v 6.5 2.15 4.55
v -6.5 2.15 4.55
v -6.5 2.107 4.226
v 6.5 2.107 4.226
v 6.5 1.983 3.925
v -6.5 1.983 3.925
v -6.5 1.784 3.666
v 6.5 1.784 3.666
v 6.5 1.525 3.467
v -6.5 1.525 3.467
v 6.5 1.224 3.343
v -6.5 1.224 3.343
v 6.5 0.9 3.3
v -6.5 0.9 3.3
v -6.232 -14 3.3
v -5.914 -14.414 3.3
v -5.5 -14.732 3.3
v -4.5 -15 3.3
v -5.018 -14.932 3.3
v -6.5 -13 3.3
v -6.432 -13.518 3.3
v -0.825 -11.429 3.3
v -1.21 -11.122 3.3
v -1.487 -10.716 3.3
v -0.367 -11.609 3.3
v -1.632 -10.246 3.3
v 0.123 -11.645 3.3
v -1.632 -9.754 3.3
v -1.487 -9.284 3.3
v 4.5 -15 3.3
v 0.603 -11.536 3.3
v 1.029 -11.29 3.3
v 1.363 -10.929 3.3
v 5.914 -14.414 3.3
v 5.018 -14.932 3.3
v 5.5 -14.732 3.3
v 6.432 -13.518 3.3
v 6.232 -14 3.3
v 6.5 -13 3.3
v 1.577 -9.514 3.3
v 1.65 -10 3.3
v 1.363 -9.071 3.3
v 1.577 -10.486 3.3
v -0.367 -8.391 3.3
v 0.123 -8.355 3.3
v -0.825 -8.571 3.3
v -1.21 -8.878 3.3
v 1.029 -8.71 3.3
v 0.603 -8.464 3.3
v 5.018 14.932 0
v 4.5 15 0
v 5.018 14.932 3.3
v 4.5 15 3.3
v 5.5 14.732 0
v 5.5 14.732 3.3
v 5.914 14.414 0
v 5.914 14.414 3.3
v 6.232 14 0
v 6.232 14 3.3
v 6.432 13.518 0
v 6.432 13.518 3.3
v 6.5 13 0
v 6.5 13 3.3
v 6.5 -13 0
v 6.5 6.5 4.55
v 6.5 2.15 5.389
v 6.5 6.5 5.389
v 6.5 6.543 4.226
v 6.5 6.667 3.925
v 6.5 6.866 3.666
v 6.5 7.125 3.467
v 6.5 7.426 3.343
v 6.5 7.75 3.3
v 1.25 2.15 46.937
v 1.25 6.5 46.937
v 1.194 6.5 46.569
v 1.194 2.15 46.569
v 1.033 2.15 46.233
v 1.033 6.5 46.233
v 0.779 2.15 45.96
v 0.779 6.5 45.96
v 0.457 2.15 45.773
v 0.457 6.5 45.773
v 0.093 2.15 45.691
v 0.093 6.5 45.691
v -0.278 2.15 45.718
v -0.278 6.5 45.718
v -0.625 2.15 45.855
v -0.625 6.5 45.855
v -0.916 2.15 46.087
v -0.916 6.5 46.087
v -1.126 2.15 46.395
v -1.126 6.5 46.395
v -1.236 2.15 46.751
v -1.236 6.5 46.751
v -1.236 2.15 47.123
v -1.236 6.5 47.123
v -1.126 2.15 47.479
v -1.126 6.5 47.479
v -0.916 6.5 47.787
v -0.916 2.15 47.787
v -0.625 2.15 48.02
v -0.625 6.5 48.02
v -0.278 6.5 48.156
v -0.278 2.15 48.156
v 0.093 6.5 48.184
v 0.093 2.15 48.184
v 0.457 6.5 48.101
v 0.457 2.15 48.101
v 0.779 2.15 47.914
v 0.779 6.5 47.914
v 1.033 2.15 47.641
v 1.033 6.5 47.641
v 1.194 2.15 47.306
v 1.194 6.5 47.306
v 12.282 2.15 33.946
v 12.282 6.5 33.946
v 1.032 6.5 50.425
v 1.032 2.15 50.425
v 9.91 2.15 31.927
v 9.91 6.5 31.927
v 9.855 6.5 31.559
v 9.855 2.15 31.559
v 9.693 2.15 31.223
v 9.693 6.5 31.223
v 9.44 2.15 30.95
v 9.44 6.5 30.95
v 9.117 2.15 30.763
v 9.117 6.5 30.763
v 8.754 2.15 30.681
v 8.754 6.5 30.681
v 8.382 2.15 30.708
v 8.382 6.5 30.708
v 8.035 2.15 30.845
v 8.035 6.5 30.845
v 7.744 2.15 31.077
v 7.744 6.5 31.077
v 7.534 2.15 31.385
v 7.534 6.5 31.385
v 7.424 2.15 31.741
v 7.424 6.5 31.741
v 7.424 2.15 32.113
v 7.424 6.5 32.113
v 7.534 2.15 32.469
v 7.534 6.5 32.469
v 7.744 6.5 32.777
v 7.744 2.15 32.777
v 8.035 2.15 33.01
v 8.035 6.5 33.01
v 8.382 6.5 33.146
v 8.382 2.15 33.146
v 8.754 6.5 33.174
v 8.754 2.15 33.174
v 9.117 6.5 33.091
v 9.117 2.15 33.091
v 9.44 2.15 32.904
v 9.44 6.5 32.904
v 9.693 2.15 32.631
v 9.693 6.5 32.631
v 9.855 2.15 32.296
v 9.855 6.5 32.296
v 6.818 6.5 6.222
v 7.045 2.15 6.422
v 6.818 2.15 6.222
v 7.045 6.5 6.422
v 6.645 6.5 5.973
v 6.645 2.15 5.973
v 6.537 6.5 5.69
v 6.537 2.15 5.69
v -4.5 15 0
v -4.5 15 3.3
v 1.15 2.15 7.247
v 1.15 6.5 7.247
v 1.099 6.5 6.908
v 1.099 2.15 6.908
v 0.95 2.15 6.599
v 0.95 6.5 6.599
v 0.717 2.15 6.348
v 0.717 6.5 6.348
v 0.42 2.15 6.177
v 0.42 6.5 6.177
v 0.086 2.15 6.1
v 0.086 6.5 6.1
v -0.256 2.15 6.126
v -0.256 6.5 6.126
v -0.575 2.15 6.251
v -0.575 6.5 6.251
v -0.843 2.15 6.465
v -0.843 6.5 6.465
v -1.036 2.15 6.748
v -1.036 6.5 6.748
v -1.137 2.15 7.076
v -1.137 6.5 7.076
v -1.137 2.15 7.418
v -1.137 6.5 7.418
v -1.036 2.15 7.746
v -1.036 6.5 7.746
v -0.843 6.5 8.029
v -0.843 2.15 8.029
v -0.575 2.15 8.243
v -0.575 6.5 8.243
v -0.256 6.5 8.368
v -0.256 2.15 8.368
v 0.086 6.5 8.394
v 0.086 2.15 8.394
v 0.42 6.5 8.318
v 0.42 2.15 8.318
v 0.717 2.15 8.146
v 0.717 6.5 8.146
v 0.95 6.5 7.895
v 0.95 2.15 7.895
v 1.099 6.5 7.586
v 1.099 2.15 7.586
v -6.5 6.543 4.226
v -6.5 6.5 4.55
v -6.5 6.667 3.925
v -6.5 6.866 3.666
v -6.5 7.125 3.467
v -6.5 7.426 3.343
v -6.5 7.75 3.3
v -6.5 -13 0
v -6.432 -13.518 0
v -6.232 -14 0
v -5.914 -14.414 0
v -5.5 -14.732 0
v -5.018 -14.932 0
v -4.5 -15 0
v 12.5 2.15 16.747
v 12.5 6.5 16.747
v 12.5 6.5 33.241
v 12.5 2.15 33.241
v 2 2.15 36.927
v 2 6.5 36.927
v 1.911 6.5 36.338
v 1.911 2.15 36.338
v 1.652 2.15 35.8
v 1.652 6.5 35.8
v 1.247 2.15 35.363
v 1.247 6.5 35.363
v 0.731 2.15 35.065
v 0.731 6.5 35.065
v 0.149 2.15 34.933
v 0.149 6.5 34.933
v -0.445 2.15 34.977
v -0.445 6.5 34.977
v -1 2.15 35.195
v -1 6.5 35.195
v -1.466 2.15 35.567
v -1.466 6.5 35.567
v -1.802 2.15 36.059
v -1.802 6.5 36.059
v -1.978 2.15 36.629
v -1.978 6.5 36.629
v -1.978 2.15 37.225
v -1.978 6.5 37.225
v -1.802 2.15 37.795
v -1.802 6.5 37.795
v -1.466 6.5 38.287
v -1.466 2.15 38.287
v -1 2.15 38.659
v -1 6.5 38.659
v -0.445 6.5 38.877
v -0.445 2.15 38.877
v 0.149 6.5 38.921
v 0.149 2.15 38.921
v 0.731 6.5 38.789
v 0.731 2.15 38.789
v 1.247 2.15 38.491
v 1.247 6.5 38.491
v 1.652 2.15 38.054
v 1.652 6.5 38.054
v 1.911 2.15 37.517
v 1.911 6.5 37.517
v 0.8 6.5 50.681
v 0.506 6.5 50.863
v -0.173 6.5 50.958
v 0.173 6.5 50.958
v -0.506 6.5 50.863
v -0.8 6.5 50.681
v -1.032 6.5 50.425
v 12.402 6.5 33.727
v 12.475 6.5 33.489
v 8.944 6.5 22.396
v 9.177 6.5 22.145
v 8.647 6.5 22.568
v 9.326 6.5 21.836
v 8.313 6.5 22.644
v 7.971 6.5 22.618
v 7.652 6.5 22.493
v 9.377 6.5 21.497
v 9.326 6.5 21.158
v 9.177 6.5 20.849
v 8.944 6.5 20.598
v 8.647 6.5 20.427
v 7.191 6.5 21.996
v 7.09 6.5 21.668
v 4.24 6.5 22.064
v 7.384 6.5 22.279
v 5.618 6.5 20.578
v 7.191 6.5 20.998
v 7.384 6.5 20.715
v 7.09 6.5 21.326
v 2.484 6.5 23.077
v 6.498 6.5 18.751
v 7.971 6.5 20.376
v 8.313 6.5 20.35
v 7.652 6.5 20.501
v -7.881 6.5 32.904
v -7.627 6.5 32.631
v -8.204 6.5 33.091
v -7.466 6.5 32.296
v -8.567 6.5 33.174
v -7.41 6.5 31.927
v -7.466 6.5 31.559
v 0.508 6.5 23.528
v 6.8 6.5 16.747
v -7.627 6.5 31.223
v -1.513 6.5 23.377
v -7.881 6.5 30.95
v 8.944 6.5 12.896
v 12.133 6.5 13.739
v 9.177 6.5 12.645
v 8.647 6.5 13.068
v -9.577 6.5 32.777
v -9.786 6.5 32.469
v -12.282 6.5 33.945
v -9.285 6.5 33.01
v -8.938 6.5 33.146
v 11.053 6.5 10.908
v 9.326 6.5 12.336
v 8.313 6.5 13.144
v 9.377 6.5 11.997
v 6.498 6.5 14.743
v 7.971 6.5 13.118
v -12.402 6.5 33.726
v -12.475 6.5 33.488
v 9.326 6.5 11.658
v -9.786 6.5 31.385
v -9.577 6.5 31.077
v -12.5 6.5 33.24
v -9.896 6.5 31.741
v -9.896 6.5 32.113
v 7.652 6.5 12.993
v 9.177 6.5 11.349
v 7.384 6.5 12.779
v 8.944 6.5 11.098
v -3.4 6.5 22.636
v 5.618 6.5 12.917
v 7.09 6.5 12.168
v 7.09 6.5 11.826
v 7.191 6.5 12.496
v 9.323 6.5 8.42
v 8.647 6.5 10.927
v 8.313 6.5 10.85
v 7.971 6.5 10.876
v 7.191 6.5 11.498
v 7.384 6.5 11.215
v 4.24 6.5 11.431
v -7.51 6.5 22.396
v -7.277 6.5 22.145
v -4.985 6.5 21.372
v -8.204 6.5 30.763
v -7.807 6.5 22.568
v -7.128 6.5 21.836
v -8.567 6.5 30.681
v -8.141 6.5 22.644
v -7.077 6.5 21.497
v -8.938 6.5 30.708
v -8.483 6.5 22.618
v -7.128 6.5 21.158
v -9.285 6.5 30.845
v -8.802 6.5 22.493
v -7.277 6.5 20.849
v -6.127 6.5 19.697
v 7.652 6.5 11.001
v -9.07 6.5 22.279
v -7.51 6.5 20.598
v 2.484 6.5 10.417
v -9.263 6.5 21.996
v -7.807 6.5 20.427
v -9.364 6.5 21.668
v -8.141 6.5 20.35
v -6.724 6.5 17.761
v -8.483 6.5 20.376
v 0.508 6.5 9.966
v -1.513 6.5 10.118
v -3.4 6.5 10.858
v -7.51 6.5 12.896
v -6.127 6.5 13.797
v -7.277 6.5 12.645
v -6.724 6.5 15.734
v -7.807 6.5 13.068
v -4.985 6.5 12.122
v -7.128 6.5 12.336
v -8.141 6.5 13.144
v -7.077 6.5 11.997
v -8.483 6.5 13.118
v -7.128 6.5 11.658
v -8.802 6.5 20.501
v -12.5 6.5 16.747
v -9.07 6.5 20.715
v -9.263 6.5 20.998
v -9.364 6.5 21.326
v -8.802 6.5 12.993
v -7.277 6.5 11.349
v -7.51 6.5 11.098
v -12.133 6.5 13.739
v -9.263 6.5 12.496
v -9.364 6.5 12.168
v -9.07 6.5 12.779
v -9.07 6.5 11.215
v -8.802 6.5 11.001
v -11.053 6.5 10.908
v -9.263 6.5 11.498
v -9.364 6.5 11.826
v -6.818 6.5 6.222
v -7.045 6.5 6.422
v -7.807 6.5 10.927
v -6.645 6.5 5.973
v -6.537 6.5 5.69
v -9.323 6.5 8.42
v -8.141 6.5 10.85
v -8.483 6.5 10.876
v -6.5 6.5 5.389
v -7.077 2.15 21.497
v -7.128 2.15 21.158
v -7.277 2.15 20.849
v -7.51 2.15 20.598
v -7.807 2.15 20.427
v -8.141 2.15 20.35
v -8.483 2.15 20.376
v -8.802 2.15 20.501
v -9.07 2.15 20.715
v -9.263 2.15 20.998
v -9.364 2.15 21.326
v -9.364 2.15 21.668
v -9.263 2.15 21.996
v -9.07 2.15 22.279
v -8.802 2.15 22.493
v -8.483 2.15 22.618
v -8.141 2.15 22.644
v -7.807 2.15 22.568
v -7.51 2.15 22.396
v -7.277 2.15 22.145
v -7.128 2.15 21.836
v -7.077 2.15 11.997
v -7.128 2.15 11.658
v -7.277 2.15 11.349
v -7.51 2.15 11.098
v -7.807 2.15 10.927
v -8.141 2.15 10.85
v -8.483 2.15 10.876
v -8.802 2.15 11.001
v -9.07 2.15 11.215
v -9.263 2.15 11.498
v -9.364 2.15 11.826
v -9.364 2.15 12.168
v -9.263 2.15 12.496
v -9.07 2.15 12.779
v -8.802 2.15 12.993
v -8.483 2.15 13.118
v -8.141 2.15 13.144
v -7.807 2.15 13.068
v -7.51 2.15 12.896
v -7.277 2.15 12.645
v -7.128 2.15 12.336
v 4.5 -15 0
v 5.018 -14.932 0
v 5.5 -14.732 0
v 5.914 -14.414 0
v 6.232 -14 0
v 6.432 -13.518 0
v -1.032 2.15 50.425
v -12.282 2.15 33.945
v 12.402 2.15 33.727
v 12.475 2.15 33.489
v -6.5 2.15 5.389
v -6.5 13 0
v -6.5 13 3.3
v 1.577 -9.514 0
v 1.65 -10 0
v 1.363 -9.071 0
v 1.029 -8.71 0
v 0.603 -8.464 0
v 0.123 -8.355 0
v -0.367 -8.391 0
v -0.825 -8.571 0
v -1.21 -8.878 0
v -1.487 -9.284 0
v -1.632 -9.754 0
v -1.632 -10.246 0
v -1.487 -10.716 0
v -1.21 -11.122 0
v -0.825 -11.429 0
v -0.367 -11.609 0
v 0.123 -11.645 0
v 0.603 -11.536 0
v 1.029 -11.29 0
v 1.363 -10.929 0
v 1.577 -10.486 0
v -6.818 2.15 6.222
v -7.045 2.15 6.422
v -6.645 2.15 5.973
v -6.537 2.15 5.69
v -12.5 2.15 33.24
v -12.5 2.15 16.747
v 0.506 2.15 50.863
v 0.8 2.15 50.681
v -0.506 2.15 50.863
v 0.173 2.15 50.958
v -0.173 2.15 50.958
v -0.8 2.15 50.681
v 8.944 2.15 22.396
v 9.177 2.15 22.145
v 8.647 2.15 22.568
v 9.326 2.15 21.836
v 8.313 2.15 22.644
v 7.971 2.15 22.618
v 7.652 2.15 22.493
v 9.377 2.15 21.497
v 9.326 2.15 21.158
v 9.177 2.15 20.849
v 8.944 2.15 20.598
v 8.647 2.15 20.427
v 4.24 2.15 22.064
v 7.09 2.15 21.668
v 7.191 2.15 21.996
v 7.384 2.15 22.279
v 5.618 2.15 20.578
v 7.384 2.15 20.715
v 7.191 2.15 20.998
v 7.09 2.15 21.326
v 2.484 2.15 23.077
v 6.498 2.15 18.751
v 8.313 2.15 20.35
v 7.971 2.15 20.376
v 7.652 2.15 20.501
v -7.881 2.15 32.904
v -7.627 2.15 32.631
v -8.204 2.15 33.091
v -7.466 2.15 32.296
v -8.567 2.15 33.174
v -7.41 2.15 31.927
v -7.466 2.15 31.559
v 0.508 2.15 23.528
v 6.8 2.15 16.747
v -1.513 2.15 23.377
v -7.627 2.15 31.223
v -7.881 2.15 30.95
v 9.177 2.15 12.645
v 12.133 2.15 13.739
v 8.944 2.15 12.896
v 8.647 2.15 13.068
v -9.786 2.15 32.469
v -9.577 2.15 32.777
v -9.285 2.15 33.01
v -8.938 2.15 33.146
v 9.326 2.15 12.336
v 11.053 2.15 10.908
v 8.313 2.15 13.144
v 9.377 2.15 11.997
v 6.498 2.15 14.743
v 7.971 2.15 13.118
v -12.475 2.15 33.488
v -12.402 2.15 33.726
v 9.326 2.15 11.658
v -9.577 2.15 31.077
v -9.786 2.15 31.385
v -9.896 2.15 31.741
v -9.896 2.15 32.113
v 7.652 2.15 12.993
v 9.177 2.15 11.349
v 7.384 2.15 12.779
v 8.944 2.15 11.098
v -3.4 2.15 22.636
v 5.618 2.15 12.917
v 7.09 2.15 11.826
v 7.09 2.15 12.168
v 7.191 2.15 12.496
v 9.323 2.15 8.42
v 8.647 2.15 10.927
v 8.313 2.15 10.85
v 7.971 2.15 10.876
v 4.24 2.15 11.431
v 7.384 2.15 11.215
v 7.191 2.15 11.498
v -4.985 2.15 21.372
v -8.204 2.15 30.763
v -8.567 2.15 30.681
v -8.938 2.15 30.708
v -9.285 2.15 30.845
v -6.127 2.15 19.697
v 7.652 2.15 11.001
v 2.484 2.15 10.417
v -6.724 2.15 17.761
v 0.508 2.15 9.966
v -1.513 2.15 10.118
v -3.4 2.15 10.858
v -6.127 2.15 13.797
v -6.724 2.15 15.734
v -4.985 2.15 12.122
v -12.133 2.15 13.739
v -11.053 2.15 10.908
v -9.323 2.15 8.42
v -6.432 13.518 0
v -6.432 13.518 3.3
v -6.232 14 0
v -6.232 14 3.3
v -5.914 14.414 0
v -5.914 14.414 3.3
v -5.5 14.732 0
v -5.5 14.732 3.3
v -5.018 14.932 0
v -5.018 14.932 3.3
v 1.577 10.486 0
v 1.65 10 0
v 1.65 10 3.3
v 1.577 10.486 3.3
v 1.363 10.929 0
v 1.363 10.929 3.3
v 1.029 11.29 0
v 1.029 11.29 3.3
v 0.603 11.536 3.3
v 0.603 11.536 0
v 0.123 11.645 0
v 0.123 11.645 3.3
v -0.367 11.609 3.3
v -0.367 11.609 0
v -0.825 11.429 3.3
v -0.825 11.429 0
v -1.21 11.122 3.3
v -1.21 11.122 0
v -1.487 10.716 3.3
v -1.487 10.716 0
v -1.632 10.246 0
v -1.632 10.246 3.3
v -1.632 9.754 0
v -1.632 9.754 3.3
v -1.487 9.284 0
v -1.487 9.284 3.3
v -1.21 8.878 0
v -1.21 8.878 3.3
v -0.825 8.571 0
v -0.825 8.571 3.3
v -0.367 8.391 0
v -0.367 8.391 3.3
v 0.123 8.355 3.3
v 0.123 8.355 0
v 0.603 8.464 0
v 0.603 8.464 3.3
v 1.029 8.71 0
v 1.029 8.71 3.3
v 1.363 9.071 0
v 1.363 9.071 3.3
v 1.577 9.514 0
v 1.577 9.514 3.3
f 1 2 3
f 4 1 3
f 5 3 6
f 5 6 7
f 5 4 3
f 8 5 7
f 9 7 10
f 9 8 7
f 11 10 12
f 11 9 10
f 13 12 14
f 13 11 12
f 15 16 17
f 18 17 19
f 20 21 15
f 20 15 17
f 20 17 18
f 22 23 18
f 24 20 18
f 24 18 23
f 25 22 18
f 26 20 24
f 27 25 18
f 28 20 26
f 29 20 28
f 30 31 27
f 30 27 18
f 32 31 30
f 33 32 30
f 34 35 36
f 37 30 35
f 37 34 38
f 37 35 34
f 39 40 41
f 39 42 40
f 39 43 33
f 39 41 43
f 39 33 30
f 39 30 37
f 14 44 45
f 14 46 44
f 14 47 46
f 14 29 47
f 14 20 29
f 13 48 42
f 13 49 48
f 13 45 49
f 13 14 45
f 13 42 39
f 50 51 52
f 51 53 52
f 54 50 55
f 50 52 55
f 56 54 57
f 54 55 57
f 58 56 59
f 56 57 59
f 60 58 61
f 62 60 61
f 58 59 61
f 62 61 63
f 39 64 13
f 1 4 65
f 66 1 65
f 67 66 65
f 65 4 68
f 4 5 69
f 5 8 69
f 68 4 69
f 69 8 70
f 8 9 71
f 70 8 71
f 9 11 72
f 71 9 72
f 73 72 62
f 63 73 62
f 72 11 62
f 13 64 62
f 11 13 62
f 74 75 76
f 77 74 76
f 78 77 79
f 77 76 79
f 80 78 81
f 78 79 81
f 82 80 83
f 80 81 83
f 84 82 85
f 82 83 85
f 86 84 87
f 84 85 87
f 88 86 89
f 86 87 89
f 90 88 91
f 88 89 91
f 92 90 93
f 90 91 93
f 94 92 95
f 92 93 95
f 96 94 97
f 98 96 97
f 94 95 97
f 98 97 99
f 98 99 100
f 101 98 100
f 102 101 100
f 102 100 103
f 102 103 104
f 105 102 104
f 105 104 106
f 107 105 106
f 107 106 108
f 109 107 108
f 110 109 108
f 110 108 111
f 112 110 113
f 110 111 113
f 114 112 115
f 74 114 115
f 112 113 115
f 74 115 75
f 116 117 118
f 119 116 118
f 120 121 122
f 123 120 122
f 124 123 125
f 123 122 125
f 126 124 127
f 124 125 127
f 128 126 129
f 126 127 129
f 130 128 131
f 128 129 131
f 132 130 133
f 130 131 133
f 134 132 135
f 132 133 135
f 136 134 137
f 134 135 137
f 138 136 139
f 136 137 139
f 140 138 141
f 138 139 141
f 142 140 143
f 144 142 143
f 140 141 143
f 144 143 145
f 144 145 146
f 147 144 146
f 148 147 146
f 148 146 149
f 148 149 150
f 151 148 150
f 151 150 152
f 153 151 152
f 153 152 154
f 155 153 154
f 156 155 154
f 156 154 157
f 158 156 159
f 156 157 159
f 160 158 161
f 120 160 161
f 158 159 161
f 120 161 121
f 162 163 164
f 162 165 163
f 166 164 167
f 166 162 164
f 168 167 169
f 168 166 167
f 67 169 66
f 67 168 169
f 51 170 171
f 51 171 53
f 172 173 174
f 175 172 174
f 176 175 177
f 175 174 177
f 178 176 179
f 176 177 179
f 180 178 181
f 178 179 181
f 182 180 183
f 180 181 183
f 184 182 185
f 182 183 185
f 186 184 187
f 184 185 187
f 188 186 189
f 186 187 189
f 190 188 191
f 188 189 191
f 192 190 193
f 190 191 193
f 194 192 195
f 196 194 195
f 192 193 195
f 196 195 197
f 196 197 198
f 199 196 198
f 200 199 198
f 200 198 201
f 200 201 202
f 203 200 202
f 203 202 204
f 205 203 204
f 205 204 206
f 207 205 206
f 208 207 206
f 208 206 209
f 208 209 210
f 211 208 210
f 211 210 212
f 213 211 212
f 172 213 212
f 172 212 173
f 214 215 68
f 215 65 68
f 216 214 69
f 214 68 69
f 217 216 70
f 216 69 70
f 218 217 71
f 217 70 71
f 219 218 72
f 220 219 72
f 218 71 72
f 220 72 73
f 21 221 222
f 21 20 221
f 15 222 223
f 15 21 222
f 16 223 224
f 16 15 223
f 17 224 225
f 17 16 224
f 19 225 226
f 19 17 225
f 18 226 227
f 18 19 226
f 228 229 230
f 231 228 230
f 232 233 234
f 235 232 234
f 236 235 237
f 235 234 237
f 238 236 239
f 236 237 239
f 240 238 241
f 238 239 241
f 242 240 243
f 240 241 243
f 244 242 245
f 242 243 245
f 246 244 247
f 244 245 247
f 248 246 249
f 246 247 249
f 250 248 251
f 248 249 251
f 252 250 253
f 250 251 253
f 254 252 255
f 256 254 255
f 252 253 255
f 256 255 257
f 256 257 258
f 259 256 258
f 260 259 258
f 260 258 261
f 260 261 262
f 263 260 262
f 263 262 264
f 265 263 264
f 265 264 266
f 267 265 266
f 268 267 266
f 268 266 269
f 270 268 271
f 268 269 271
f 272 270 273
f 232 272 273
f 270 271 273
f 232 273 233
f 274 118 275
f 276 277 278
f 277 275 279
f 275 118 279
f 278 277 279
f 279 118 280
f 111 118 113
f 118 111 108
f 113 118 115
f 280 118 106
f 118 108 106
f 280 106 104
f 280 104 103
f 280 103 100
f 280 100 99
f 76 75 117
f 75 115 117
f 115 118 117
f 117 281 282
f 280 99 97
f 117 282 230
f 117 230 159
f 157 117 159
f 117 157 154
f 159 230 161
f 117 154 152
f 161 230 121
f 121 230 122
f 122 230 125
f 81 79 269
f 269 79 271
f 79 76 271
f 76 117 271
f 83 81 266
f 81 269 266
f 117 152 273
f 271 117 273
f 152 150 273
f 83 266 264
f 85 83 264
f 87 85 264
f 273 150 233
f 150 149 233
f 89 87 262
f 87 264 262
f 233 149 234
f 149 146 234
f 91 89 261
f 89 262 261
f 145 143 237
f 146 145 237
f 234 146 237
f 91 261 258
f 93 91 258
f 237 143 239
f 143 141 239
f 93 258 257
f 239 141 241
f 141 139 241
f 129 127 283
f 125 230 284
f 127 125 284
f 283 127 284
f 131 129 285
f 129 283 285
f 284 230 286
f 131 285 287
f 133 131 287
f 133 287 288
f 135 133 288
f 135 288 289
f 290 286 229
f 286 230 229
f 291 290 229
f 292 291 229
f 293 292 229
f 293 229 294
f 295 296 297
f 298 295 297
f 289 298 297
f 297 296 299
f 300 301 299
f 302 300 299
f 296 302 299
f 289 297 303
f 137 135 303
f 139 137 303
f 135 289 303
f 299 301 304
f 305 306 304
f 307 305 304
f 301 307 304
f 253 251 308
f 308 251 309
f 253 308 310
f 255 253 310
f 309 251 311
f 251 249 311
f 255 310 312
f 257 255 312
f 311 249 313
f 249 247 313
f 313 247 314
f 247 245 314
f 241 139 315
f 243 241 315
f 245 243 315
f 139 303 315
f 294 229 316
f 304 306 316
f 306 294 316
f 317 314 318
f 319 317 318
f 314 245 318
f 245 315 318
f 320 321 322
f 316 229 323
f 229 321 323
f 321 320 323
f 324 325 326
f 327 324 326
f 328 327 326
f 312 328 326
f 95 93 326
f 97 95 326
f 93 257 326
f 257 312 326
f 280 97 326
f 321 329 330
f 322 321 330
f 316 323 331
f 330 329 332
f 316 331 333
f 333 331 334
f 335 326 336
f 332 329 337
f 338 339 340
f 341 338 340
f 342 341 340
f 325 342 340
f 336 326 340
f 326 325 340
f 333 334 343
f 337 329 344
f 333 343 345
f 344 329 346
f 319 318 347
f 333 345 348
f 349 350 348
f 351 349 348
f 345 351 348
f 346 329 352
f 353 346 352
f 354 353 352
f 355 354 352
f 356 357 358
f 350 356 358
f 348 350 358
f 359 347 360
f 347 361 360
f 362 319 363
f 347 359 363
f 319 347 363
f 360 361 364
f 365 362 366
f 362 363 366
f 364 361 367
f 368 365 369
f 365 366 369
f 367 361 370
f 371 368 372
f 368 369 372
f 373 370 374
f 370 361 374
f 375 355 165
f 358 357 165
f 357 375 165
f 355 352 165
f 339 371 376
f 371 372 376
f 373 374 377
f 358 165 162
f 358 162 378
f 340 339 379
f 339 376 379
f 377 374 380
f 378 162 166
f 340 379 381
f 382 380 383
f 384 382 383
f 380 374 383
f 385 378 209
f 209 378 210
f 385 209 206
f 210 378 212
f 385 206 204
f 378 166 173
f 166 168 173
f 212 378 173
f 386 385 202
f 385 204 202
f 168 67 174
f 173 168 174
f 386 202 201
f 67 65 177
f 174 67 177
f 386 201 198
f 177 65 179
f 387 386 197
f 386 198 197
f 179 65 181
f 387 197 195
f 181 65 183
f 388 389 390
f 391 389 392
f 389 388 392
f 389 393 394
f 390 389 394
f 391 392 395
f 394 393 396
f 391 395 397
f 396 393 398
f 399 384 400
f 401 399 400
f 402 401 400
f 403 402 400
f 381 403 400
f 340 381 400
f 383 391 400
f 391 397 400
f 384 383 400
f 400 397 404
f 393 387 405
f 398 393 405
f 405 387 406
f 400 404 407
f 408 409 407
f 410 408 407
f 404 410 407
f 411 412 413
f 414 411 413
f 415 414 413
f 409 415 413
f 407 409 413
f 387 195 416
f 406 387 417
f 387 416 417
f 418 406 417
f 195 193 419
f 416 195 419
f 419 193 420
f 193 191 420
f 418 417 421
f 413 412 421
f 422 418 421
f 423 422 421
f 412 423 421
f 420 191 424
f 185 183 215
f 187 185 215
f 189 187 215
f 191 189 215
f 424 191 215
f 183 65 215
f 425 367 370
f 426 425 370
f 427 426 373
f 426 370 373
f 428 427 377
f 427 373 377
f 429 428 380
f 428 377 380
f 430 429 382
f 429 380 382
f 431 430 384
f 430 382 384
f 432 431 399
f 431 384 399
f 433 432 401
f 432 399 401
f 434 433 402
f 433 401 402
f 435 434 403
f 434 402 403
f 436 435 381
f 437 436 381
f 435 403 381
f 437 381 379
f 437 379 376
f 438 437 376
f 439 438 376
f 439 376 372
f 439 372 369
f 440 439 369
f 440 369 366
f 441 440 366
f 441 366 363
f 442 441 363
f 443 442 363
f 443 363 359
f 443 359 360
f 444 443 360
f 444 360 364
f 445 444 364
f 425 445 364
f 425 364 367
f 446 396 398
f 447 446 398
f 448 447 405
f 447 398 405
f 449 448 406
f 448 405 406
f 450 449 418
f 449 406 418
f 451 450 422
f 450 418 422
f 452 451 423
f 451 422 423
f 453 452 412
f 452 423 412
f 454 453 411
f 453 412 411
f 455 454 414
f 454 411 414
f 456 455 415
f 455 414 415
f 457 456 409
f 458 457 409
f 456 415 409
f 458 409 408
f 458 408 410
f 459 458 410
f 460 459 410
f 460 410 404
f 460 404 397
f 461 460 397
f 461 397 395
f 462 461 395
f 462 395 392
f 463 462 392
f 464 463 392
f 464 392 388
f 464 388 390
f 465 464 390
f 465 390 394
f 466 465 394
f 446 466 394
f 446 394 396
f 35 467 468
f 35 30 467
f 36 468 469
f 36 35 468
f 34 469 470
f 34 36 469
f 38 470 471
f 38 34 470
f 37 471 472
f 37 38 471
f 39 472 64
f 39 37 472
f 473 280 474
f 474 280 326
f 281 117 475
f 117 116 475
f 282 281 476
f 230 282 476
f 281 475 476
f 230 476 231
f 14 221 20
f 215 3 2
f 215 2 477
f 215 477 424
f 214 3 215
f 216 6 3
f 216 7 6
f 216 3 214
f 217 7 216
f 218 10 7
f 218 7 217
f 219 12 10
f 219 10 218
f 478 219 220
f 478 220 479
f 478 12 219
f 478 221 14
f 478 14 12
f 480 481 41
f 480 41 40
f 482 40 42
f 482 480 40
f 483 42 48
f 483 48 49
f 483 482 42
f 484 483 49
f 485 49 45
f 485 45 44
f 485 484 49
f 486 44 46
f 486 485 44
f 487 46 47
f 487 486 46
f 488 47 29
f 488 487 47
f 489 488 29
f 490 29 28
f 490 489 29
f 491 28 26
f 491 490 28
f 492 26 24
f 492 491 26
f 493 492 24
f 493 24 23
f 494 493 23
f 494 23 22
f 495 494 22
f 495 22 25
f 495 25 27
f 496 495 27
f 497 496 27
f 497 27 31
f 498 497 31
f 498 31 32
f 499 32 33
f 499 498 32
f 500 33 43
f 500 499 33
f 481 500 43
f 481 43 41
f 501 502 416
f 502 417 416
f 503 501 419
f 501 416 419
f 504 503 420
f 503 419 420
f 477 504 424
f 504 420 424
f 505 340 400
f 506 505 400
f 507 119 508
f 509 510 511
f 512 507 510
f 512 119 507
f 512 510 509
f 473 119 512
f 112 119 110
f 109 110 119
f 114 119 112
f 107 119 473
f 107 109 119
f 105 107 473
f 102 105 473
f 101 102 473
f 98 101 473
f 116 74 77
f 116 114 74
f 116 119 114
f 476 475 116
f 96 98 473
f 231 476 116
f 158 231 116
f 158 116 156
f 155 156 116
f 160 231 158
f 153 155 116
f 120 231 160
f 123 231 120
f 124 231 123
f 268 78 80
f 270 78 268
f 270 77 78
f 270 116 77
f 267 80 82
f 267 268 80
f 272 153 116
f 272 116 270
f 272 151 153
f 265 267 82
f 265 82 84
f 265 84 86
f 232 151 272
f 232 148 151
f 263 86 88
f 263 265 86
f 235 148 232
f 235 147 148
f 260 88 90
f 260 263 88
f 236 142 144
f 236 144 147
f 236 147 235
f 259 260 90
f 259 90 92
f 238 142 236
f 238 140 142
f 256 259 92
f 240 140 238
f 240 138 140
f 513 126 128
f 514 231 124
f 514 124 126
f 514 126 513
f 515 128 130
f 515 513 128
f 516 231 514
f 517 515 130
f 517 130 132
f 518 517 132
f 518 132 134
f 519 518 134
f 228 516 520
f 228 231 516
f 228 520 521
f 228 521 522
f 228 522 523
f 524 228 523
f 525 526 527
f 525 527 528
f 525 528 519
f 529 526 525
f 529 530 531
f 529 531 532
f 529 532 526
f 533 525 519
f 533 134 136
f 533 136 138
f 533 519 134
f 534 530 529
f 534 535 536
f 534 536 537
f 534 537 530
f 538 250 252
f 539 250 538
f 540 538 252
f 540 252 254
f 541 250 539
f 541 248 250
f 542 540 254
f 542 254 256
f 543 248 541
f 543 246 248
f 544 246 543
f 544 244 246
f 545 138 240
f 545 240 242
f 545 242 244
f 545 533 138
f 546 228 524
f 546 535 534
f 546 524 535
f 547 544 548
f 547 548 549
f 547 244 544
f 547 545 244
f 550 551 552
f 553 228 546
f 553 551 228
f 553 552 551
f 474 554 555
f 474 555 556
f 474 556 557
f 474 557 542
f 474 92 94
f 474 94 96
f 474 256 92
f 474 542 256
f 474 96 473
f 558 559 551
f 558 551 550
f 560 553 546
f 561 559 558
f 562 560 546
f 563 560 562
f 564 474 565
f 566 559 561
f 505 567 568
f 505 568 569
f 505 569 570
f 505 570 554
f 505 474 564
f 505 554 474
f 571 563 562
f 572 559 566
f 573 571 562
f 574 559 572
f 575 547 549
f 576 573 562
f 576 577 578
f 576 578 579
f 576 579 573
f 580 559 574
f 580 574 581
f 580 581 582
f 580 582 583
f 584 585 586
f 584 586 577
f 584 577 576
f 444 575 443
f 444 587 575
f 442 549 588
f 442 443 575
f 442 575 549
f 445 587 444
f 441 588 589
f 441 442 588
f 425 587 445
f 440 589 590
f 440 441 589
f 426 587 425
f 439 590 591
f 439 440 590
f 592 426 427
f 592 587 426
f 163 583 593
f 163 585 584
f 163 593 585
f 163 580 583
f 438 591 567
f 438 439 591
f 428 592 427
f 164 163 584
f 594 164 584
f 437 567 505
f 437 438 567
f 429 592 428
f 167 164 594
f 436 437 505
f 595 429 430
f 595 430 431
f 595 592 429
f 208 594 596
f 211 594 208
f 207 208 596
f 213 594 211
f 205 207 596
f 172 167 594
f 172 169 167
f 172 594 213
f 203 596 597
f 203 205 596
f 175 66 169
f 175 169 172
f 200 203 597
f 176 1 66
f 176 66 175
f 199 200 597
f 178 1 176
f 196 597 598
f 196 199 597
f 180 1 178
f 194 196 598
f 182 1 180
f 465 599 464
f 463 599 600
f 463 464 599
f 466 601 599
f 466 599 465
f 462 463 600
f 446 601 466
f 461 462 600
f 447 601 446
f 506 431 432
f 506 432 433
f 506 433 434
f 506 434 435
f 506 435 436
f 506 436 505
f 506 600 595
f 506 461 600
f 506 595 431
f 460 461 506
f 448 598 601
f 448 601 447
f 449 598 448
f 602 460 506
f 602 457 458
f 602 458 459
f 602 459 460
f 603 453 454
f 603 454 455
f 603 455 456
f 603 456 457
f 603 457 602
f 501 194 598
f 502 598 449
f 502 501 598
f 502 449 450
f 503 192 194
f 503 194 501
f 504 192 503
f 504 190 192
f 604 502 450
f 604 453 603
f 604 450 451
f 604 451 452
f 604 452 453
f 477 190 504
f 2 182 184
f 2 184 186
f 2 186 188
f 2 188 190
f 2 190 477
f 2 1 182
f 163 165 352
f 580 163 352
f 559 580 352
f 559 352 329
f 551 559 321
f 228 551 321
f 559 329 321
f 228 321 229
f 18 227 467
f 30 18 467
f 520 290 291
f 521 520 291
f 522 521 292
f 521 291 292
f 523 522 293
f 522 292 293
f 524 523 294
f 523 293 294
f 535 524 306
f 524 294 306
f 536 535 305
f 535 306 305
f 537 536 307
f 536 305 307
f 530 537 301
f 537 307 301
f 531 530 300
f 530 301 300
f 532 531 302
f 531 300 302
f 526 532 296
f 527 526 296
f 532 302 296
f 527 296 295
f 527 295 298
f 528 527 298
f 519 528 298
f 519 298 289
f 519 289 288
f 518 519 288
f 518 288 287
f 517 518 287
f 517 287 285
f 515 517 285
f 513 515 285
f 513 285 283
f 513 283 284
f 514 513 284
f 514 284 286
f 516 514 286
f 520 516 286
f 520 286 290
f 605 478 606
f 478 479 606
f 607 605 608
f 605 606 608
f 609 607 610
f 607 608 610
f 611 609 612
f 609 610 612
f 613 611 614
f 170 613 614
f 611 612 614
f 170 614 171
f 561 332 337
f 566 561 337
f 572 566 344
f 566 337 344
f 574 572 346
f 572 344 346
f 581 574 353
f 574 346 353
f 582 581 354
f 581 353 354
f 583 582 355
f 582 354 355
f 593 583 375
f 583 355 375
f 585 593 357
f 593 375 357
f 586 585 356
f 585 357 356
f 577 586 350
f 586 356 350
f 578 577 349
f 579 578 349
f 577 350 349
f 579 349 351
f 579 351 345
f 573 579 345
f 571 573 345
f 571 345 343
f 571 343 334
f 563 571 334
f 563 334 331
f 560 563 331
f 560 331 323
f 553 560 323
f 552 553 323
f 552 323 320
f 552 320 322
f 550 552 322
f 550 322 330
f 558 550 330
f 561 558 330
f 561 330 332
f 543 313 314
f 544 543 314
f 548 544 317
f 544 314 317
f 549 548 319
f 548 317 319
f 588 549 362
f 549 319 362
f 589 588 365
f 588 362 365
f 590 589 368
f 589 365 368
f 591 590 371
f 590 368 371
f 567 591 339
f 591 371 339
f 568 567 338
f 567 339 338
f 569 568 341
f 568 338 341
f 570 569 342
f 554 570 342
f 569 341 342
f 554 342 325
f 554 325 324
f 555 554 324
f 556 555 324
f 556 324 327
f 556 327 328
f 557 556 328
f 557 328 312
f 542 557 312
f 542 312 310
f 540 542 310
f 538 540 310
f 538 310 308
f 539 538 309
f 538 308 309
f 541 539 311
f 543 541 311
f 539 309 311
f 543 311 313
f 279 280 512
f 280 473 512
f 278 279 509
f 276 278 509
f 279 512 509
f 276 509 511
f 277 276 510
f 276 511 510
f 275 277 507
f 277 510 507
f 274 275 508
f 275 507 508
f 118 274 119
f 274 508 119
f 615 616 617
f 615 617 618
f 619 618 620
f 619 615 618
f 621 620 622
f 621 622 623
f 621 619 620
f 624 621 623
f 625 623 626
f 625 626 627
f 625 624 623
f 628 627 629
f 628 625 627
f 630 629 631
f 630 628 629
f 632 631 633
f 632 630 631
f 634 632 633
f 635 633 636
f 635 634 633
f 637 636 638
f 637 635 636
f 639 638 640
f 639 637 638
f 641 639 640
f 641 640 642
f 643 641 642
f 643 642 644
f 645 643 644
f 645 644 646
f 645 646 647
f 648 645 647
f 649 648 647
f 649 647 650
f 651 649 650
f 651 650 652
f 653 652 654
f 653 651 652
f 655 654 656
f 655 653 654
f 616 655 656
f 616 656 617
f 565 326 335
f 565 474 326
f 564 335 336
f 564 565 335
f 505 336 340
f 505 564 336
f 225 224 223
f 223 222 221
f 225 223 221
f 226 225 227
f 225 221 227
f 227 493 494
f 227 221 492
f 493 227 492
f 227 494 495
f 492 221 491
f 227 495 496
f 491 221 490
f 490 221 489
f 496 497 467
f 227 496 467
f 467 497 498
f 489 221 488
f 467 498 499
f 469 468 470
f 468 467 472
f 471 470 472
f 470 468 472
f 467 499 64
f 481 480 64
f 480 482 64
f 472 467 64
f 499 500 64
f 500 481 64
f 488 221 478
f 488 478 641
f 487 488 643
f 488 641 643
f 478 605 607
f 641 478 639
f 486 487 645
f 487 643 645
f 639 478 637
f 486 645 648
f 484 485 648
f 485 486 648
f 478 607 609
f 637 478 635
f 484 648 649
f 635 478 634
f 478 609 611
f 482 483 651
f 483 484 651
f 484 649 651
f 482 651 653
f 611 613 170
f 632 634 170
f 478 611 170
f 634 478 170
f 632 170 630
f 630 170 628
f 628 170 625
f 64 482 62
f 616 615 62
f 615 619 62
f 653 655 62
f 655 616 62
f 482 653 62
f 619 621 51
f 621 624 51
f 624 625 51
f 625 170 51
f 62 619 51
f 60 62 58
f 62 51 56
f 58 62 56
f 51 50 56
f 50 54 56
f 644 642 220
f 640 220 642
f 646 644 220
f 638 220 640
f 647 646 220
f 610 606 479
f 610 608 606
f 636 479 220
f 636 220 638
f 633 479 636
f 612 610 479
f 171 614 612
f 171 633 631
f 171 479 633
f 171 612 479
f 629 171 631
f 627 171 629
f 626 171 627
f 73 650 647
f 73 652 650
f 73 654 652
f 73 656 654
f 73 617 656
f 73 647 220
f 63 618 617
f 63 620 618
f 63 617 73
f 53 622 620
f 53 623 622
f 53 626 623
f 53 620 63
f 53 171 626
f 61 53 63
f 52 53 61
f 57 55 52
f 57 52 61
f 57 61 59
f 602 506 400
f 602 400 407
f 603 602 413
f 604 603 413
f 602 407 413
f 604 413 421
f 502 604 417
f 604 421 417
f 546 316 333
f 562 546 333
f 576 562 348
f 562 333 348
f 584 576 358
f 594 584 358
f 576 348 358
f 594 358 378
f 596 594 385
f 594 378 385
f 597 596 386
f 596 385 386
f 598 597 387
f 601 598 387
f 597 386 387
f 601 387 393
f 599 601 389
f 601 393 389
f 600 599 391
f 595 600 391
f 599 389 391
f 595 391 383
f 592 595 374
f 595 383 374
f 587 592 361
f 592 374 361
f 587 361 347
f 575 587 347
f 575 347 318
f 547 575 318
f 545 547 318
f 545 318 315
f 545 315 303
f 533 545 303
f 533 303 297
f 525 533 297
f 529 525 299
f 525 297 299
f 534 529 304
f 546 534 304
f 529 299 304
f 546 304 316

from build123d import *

# Parameters (mm, degrees)
ESQUISSE1_W             = 13
ESQUISSE1_H             = 30
ESQUISSE1_R             = 1.65
BOSS_EXTRU_1_DEPTH      = 3.3
CONG_1_R                = 2
ESQUISSE2_W             = 13
ESQUISSE2_H             = 4.34999702
BOSS_EXTRU_2_DEPTH      = 2.77
ESQUISSE4_R             = 6.8
BOSS_EXTRU_4_DEPTH      = 4.349997
ESQUISSE6_R             = 1.15
ENL_V_MAT_EXTRU_2_DEPTH = 22.49999702
ESQUISSE8_R             = 2
ESQUISSE8_R_2           = 1.25
BOSS_EXTRU_5_DEPTH      = 4.349997
CONG_2_R                = 1.25


with BuildPart() as part:
    # Esquisse1 → Boss.-Extru.1 (new body)
    with BuildSketch(Plane.XY):
        Rectangle(ESQUISSE1_W, ESQUISSE1_H)
        with Locations((0, 10)):
            Circle(ESQUISSE1_R, mode=Mode.SUBTRACT)
        with Locations((0, -10)):
            Circle(ESQUISSE1_R, mode=Mode.SUBTRACT)
    extrude(amount=BOSS_EXTRU_1_DEPTH)

    # Congé1
    cong_1_edges = [part.edges().sort_by_distance(p)[0] for p in [
        (6.5, -15, 1.65),
        (-6.5, -15, 1.65),
        (-6.5, 15, 1.65),
        (6.5, 15, 1.65),
    ]]
    fillet(cong_1_edges, radius=CONG_1_R)

    # Esquisse2 → Boss.-Extru.2 (add)
    with BuildSketch(Plane.XY.offset(3.3)):
        with Locations((0, 4.32499851)):
            Rectangle(ESQUISSE2_W, ESQUISSE2_H)
    extrude(amount=BOSS_EXTRU_2_DEPTH)

    # Esquisse4 → Boss.-Extru.4 (add)
    with BuildSketch(Plane(origin=(0, 6.49999702, 0), x_dir=(1, 0, 0), z_dir=(0, 1, 0))):
        with BuildLine():
            Line((-6.5, -6.07), (6.5, -6.07))
            ThreePointArc((6.5, -6.07), (12.5, -16.747078252), (6.5, -27.424156504))
            Line((6.5, -27.424156504), (-6.5, -27.424156504))
            ThreePointArc((-6.5, -27.424156504), (-12.5, -16.747078252), (-6.5, -6.07))
        make_face()
        with Locations((0, -16.747078252)):
            Circle(ESQUISSE4_R, mode=Mode.SUBTRACT)
    extrude(amount=-BOSS_EXTRU_4_DEPTH)

    # Esquisse6 → Enlèv. mat.-Extru.2 (cut, through all)
    with BuildSketch(Plane(origin=(0, 6.49999702, 0), x_dir=(1, 0, 0), z_dir=(0, 1, 0))):
        with Locations((0, -7.247078252)):
            Circle(ESQUISSE6_R)
        with Locations((-8.227241336, -11.997078252)):
            Circle(ESQUISSE6_R)
        with Locations((8.227241336, -11.997078252)):
            Circle(ESQUISSE6_R)
        with Locations((-8.227241336, -21.497078252)):
            Circle(ESQUISSE6_R)
        with Locations((8.227241336, -21.497078252)):
            Circle(ESQUISSE6_R)
    extrude(amount=-ENL_V_MAT_EXTRU_2_DEPTH, mode=Mode.SUBTRACT)

    # Esquisse8 → Boss.-Extru.5 (add)
    with BuildSketch(Plane(origin=(0, 6.49999702, 0), x_dir=(1, 0, 0), z_dir=(0, 1, 0))):
        with BuildLine():
            Line((0, -51.937078252), (-12.5, -33.625808063))
            Line((-12.5, -33.625808063), (-12.5, -16.747078252))
            ThreePointArc((-12.5, -16.747078252), (-10.897247359, -22.870802609), (-6.5, -27.424156504))
            Line((-6.5, -27.424156504), (6.5, -27.424156504))
            ThreePointArc((6.5, -27.424156504), (10.897247359, -22.870802609), (12.5, -16.747078252))
            Line((12.5, -16.747078252), (12.5, -33.627078252))
            Line((12.5, -33.627078252), (0, -51.937078252))
        make_face()
        with Locations((0, -36.927078252)):
            Circle(ESQUISSE8_R, mode=Mode.SUBTRACT)
        with Locations((8.660254038, -31.927078252)):
            Circle(ESQUISSE8_R_2, mode=Mode.SUBTRACT)
        with Locations((-8.660254038, -31.927078252)):
            Circle(ESQUISSE8_R_2, mode=Mode.SUBTRACT)
        with Locations((0, -46.937078252)):
            Circle(ESQUISSE8_R_2, mode=Mode.SUBTRACT)
    extrude(amount=-BOSS_EXTRU_5_DEPTH)

    # Congé2
    cong_2_edges = [part.edges().sort_by_distance(p)[0] for p in [
        (-12.5, 4.32499852, 33.625808063),
        (0, 4.32499852, 51.937078252),
        (12.5, 4.32499852, 33.627078252),
        (0, 6.49999702, 3.3),
        (0, 2.15, 3.3),
        (6.5, 4.32499851, 6.07),
        (-6.5, 4.32499851, 6.07),
    ]]
    fillet(cong_2_edges, radius=CONG_2_R)


solid = part.part
